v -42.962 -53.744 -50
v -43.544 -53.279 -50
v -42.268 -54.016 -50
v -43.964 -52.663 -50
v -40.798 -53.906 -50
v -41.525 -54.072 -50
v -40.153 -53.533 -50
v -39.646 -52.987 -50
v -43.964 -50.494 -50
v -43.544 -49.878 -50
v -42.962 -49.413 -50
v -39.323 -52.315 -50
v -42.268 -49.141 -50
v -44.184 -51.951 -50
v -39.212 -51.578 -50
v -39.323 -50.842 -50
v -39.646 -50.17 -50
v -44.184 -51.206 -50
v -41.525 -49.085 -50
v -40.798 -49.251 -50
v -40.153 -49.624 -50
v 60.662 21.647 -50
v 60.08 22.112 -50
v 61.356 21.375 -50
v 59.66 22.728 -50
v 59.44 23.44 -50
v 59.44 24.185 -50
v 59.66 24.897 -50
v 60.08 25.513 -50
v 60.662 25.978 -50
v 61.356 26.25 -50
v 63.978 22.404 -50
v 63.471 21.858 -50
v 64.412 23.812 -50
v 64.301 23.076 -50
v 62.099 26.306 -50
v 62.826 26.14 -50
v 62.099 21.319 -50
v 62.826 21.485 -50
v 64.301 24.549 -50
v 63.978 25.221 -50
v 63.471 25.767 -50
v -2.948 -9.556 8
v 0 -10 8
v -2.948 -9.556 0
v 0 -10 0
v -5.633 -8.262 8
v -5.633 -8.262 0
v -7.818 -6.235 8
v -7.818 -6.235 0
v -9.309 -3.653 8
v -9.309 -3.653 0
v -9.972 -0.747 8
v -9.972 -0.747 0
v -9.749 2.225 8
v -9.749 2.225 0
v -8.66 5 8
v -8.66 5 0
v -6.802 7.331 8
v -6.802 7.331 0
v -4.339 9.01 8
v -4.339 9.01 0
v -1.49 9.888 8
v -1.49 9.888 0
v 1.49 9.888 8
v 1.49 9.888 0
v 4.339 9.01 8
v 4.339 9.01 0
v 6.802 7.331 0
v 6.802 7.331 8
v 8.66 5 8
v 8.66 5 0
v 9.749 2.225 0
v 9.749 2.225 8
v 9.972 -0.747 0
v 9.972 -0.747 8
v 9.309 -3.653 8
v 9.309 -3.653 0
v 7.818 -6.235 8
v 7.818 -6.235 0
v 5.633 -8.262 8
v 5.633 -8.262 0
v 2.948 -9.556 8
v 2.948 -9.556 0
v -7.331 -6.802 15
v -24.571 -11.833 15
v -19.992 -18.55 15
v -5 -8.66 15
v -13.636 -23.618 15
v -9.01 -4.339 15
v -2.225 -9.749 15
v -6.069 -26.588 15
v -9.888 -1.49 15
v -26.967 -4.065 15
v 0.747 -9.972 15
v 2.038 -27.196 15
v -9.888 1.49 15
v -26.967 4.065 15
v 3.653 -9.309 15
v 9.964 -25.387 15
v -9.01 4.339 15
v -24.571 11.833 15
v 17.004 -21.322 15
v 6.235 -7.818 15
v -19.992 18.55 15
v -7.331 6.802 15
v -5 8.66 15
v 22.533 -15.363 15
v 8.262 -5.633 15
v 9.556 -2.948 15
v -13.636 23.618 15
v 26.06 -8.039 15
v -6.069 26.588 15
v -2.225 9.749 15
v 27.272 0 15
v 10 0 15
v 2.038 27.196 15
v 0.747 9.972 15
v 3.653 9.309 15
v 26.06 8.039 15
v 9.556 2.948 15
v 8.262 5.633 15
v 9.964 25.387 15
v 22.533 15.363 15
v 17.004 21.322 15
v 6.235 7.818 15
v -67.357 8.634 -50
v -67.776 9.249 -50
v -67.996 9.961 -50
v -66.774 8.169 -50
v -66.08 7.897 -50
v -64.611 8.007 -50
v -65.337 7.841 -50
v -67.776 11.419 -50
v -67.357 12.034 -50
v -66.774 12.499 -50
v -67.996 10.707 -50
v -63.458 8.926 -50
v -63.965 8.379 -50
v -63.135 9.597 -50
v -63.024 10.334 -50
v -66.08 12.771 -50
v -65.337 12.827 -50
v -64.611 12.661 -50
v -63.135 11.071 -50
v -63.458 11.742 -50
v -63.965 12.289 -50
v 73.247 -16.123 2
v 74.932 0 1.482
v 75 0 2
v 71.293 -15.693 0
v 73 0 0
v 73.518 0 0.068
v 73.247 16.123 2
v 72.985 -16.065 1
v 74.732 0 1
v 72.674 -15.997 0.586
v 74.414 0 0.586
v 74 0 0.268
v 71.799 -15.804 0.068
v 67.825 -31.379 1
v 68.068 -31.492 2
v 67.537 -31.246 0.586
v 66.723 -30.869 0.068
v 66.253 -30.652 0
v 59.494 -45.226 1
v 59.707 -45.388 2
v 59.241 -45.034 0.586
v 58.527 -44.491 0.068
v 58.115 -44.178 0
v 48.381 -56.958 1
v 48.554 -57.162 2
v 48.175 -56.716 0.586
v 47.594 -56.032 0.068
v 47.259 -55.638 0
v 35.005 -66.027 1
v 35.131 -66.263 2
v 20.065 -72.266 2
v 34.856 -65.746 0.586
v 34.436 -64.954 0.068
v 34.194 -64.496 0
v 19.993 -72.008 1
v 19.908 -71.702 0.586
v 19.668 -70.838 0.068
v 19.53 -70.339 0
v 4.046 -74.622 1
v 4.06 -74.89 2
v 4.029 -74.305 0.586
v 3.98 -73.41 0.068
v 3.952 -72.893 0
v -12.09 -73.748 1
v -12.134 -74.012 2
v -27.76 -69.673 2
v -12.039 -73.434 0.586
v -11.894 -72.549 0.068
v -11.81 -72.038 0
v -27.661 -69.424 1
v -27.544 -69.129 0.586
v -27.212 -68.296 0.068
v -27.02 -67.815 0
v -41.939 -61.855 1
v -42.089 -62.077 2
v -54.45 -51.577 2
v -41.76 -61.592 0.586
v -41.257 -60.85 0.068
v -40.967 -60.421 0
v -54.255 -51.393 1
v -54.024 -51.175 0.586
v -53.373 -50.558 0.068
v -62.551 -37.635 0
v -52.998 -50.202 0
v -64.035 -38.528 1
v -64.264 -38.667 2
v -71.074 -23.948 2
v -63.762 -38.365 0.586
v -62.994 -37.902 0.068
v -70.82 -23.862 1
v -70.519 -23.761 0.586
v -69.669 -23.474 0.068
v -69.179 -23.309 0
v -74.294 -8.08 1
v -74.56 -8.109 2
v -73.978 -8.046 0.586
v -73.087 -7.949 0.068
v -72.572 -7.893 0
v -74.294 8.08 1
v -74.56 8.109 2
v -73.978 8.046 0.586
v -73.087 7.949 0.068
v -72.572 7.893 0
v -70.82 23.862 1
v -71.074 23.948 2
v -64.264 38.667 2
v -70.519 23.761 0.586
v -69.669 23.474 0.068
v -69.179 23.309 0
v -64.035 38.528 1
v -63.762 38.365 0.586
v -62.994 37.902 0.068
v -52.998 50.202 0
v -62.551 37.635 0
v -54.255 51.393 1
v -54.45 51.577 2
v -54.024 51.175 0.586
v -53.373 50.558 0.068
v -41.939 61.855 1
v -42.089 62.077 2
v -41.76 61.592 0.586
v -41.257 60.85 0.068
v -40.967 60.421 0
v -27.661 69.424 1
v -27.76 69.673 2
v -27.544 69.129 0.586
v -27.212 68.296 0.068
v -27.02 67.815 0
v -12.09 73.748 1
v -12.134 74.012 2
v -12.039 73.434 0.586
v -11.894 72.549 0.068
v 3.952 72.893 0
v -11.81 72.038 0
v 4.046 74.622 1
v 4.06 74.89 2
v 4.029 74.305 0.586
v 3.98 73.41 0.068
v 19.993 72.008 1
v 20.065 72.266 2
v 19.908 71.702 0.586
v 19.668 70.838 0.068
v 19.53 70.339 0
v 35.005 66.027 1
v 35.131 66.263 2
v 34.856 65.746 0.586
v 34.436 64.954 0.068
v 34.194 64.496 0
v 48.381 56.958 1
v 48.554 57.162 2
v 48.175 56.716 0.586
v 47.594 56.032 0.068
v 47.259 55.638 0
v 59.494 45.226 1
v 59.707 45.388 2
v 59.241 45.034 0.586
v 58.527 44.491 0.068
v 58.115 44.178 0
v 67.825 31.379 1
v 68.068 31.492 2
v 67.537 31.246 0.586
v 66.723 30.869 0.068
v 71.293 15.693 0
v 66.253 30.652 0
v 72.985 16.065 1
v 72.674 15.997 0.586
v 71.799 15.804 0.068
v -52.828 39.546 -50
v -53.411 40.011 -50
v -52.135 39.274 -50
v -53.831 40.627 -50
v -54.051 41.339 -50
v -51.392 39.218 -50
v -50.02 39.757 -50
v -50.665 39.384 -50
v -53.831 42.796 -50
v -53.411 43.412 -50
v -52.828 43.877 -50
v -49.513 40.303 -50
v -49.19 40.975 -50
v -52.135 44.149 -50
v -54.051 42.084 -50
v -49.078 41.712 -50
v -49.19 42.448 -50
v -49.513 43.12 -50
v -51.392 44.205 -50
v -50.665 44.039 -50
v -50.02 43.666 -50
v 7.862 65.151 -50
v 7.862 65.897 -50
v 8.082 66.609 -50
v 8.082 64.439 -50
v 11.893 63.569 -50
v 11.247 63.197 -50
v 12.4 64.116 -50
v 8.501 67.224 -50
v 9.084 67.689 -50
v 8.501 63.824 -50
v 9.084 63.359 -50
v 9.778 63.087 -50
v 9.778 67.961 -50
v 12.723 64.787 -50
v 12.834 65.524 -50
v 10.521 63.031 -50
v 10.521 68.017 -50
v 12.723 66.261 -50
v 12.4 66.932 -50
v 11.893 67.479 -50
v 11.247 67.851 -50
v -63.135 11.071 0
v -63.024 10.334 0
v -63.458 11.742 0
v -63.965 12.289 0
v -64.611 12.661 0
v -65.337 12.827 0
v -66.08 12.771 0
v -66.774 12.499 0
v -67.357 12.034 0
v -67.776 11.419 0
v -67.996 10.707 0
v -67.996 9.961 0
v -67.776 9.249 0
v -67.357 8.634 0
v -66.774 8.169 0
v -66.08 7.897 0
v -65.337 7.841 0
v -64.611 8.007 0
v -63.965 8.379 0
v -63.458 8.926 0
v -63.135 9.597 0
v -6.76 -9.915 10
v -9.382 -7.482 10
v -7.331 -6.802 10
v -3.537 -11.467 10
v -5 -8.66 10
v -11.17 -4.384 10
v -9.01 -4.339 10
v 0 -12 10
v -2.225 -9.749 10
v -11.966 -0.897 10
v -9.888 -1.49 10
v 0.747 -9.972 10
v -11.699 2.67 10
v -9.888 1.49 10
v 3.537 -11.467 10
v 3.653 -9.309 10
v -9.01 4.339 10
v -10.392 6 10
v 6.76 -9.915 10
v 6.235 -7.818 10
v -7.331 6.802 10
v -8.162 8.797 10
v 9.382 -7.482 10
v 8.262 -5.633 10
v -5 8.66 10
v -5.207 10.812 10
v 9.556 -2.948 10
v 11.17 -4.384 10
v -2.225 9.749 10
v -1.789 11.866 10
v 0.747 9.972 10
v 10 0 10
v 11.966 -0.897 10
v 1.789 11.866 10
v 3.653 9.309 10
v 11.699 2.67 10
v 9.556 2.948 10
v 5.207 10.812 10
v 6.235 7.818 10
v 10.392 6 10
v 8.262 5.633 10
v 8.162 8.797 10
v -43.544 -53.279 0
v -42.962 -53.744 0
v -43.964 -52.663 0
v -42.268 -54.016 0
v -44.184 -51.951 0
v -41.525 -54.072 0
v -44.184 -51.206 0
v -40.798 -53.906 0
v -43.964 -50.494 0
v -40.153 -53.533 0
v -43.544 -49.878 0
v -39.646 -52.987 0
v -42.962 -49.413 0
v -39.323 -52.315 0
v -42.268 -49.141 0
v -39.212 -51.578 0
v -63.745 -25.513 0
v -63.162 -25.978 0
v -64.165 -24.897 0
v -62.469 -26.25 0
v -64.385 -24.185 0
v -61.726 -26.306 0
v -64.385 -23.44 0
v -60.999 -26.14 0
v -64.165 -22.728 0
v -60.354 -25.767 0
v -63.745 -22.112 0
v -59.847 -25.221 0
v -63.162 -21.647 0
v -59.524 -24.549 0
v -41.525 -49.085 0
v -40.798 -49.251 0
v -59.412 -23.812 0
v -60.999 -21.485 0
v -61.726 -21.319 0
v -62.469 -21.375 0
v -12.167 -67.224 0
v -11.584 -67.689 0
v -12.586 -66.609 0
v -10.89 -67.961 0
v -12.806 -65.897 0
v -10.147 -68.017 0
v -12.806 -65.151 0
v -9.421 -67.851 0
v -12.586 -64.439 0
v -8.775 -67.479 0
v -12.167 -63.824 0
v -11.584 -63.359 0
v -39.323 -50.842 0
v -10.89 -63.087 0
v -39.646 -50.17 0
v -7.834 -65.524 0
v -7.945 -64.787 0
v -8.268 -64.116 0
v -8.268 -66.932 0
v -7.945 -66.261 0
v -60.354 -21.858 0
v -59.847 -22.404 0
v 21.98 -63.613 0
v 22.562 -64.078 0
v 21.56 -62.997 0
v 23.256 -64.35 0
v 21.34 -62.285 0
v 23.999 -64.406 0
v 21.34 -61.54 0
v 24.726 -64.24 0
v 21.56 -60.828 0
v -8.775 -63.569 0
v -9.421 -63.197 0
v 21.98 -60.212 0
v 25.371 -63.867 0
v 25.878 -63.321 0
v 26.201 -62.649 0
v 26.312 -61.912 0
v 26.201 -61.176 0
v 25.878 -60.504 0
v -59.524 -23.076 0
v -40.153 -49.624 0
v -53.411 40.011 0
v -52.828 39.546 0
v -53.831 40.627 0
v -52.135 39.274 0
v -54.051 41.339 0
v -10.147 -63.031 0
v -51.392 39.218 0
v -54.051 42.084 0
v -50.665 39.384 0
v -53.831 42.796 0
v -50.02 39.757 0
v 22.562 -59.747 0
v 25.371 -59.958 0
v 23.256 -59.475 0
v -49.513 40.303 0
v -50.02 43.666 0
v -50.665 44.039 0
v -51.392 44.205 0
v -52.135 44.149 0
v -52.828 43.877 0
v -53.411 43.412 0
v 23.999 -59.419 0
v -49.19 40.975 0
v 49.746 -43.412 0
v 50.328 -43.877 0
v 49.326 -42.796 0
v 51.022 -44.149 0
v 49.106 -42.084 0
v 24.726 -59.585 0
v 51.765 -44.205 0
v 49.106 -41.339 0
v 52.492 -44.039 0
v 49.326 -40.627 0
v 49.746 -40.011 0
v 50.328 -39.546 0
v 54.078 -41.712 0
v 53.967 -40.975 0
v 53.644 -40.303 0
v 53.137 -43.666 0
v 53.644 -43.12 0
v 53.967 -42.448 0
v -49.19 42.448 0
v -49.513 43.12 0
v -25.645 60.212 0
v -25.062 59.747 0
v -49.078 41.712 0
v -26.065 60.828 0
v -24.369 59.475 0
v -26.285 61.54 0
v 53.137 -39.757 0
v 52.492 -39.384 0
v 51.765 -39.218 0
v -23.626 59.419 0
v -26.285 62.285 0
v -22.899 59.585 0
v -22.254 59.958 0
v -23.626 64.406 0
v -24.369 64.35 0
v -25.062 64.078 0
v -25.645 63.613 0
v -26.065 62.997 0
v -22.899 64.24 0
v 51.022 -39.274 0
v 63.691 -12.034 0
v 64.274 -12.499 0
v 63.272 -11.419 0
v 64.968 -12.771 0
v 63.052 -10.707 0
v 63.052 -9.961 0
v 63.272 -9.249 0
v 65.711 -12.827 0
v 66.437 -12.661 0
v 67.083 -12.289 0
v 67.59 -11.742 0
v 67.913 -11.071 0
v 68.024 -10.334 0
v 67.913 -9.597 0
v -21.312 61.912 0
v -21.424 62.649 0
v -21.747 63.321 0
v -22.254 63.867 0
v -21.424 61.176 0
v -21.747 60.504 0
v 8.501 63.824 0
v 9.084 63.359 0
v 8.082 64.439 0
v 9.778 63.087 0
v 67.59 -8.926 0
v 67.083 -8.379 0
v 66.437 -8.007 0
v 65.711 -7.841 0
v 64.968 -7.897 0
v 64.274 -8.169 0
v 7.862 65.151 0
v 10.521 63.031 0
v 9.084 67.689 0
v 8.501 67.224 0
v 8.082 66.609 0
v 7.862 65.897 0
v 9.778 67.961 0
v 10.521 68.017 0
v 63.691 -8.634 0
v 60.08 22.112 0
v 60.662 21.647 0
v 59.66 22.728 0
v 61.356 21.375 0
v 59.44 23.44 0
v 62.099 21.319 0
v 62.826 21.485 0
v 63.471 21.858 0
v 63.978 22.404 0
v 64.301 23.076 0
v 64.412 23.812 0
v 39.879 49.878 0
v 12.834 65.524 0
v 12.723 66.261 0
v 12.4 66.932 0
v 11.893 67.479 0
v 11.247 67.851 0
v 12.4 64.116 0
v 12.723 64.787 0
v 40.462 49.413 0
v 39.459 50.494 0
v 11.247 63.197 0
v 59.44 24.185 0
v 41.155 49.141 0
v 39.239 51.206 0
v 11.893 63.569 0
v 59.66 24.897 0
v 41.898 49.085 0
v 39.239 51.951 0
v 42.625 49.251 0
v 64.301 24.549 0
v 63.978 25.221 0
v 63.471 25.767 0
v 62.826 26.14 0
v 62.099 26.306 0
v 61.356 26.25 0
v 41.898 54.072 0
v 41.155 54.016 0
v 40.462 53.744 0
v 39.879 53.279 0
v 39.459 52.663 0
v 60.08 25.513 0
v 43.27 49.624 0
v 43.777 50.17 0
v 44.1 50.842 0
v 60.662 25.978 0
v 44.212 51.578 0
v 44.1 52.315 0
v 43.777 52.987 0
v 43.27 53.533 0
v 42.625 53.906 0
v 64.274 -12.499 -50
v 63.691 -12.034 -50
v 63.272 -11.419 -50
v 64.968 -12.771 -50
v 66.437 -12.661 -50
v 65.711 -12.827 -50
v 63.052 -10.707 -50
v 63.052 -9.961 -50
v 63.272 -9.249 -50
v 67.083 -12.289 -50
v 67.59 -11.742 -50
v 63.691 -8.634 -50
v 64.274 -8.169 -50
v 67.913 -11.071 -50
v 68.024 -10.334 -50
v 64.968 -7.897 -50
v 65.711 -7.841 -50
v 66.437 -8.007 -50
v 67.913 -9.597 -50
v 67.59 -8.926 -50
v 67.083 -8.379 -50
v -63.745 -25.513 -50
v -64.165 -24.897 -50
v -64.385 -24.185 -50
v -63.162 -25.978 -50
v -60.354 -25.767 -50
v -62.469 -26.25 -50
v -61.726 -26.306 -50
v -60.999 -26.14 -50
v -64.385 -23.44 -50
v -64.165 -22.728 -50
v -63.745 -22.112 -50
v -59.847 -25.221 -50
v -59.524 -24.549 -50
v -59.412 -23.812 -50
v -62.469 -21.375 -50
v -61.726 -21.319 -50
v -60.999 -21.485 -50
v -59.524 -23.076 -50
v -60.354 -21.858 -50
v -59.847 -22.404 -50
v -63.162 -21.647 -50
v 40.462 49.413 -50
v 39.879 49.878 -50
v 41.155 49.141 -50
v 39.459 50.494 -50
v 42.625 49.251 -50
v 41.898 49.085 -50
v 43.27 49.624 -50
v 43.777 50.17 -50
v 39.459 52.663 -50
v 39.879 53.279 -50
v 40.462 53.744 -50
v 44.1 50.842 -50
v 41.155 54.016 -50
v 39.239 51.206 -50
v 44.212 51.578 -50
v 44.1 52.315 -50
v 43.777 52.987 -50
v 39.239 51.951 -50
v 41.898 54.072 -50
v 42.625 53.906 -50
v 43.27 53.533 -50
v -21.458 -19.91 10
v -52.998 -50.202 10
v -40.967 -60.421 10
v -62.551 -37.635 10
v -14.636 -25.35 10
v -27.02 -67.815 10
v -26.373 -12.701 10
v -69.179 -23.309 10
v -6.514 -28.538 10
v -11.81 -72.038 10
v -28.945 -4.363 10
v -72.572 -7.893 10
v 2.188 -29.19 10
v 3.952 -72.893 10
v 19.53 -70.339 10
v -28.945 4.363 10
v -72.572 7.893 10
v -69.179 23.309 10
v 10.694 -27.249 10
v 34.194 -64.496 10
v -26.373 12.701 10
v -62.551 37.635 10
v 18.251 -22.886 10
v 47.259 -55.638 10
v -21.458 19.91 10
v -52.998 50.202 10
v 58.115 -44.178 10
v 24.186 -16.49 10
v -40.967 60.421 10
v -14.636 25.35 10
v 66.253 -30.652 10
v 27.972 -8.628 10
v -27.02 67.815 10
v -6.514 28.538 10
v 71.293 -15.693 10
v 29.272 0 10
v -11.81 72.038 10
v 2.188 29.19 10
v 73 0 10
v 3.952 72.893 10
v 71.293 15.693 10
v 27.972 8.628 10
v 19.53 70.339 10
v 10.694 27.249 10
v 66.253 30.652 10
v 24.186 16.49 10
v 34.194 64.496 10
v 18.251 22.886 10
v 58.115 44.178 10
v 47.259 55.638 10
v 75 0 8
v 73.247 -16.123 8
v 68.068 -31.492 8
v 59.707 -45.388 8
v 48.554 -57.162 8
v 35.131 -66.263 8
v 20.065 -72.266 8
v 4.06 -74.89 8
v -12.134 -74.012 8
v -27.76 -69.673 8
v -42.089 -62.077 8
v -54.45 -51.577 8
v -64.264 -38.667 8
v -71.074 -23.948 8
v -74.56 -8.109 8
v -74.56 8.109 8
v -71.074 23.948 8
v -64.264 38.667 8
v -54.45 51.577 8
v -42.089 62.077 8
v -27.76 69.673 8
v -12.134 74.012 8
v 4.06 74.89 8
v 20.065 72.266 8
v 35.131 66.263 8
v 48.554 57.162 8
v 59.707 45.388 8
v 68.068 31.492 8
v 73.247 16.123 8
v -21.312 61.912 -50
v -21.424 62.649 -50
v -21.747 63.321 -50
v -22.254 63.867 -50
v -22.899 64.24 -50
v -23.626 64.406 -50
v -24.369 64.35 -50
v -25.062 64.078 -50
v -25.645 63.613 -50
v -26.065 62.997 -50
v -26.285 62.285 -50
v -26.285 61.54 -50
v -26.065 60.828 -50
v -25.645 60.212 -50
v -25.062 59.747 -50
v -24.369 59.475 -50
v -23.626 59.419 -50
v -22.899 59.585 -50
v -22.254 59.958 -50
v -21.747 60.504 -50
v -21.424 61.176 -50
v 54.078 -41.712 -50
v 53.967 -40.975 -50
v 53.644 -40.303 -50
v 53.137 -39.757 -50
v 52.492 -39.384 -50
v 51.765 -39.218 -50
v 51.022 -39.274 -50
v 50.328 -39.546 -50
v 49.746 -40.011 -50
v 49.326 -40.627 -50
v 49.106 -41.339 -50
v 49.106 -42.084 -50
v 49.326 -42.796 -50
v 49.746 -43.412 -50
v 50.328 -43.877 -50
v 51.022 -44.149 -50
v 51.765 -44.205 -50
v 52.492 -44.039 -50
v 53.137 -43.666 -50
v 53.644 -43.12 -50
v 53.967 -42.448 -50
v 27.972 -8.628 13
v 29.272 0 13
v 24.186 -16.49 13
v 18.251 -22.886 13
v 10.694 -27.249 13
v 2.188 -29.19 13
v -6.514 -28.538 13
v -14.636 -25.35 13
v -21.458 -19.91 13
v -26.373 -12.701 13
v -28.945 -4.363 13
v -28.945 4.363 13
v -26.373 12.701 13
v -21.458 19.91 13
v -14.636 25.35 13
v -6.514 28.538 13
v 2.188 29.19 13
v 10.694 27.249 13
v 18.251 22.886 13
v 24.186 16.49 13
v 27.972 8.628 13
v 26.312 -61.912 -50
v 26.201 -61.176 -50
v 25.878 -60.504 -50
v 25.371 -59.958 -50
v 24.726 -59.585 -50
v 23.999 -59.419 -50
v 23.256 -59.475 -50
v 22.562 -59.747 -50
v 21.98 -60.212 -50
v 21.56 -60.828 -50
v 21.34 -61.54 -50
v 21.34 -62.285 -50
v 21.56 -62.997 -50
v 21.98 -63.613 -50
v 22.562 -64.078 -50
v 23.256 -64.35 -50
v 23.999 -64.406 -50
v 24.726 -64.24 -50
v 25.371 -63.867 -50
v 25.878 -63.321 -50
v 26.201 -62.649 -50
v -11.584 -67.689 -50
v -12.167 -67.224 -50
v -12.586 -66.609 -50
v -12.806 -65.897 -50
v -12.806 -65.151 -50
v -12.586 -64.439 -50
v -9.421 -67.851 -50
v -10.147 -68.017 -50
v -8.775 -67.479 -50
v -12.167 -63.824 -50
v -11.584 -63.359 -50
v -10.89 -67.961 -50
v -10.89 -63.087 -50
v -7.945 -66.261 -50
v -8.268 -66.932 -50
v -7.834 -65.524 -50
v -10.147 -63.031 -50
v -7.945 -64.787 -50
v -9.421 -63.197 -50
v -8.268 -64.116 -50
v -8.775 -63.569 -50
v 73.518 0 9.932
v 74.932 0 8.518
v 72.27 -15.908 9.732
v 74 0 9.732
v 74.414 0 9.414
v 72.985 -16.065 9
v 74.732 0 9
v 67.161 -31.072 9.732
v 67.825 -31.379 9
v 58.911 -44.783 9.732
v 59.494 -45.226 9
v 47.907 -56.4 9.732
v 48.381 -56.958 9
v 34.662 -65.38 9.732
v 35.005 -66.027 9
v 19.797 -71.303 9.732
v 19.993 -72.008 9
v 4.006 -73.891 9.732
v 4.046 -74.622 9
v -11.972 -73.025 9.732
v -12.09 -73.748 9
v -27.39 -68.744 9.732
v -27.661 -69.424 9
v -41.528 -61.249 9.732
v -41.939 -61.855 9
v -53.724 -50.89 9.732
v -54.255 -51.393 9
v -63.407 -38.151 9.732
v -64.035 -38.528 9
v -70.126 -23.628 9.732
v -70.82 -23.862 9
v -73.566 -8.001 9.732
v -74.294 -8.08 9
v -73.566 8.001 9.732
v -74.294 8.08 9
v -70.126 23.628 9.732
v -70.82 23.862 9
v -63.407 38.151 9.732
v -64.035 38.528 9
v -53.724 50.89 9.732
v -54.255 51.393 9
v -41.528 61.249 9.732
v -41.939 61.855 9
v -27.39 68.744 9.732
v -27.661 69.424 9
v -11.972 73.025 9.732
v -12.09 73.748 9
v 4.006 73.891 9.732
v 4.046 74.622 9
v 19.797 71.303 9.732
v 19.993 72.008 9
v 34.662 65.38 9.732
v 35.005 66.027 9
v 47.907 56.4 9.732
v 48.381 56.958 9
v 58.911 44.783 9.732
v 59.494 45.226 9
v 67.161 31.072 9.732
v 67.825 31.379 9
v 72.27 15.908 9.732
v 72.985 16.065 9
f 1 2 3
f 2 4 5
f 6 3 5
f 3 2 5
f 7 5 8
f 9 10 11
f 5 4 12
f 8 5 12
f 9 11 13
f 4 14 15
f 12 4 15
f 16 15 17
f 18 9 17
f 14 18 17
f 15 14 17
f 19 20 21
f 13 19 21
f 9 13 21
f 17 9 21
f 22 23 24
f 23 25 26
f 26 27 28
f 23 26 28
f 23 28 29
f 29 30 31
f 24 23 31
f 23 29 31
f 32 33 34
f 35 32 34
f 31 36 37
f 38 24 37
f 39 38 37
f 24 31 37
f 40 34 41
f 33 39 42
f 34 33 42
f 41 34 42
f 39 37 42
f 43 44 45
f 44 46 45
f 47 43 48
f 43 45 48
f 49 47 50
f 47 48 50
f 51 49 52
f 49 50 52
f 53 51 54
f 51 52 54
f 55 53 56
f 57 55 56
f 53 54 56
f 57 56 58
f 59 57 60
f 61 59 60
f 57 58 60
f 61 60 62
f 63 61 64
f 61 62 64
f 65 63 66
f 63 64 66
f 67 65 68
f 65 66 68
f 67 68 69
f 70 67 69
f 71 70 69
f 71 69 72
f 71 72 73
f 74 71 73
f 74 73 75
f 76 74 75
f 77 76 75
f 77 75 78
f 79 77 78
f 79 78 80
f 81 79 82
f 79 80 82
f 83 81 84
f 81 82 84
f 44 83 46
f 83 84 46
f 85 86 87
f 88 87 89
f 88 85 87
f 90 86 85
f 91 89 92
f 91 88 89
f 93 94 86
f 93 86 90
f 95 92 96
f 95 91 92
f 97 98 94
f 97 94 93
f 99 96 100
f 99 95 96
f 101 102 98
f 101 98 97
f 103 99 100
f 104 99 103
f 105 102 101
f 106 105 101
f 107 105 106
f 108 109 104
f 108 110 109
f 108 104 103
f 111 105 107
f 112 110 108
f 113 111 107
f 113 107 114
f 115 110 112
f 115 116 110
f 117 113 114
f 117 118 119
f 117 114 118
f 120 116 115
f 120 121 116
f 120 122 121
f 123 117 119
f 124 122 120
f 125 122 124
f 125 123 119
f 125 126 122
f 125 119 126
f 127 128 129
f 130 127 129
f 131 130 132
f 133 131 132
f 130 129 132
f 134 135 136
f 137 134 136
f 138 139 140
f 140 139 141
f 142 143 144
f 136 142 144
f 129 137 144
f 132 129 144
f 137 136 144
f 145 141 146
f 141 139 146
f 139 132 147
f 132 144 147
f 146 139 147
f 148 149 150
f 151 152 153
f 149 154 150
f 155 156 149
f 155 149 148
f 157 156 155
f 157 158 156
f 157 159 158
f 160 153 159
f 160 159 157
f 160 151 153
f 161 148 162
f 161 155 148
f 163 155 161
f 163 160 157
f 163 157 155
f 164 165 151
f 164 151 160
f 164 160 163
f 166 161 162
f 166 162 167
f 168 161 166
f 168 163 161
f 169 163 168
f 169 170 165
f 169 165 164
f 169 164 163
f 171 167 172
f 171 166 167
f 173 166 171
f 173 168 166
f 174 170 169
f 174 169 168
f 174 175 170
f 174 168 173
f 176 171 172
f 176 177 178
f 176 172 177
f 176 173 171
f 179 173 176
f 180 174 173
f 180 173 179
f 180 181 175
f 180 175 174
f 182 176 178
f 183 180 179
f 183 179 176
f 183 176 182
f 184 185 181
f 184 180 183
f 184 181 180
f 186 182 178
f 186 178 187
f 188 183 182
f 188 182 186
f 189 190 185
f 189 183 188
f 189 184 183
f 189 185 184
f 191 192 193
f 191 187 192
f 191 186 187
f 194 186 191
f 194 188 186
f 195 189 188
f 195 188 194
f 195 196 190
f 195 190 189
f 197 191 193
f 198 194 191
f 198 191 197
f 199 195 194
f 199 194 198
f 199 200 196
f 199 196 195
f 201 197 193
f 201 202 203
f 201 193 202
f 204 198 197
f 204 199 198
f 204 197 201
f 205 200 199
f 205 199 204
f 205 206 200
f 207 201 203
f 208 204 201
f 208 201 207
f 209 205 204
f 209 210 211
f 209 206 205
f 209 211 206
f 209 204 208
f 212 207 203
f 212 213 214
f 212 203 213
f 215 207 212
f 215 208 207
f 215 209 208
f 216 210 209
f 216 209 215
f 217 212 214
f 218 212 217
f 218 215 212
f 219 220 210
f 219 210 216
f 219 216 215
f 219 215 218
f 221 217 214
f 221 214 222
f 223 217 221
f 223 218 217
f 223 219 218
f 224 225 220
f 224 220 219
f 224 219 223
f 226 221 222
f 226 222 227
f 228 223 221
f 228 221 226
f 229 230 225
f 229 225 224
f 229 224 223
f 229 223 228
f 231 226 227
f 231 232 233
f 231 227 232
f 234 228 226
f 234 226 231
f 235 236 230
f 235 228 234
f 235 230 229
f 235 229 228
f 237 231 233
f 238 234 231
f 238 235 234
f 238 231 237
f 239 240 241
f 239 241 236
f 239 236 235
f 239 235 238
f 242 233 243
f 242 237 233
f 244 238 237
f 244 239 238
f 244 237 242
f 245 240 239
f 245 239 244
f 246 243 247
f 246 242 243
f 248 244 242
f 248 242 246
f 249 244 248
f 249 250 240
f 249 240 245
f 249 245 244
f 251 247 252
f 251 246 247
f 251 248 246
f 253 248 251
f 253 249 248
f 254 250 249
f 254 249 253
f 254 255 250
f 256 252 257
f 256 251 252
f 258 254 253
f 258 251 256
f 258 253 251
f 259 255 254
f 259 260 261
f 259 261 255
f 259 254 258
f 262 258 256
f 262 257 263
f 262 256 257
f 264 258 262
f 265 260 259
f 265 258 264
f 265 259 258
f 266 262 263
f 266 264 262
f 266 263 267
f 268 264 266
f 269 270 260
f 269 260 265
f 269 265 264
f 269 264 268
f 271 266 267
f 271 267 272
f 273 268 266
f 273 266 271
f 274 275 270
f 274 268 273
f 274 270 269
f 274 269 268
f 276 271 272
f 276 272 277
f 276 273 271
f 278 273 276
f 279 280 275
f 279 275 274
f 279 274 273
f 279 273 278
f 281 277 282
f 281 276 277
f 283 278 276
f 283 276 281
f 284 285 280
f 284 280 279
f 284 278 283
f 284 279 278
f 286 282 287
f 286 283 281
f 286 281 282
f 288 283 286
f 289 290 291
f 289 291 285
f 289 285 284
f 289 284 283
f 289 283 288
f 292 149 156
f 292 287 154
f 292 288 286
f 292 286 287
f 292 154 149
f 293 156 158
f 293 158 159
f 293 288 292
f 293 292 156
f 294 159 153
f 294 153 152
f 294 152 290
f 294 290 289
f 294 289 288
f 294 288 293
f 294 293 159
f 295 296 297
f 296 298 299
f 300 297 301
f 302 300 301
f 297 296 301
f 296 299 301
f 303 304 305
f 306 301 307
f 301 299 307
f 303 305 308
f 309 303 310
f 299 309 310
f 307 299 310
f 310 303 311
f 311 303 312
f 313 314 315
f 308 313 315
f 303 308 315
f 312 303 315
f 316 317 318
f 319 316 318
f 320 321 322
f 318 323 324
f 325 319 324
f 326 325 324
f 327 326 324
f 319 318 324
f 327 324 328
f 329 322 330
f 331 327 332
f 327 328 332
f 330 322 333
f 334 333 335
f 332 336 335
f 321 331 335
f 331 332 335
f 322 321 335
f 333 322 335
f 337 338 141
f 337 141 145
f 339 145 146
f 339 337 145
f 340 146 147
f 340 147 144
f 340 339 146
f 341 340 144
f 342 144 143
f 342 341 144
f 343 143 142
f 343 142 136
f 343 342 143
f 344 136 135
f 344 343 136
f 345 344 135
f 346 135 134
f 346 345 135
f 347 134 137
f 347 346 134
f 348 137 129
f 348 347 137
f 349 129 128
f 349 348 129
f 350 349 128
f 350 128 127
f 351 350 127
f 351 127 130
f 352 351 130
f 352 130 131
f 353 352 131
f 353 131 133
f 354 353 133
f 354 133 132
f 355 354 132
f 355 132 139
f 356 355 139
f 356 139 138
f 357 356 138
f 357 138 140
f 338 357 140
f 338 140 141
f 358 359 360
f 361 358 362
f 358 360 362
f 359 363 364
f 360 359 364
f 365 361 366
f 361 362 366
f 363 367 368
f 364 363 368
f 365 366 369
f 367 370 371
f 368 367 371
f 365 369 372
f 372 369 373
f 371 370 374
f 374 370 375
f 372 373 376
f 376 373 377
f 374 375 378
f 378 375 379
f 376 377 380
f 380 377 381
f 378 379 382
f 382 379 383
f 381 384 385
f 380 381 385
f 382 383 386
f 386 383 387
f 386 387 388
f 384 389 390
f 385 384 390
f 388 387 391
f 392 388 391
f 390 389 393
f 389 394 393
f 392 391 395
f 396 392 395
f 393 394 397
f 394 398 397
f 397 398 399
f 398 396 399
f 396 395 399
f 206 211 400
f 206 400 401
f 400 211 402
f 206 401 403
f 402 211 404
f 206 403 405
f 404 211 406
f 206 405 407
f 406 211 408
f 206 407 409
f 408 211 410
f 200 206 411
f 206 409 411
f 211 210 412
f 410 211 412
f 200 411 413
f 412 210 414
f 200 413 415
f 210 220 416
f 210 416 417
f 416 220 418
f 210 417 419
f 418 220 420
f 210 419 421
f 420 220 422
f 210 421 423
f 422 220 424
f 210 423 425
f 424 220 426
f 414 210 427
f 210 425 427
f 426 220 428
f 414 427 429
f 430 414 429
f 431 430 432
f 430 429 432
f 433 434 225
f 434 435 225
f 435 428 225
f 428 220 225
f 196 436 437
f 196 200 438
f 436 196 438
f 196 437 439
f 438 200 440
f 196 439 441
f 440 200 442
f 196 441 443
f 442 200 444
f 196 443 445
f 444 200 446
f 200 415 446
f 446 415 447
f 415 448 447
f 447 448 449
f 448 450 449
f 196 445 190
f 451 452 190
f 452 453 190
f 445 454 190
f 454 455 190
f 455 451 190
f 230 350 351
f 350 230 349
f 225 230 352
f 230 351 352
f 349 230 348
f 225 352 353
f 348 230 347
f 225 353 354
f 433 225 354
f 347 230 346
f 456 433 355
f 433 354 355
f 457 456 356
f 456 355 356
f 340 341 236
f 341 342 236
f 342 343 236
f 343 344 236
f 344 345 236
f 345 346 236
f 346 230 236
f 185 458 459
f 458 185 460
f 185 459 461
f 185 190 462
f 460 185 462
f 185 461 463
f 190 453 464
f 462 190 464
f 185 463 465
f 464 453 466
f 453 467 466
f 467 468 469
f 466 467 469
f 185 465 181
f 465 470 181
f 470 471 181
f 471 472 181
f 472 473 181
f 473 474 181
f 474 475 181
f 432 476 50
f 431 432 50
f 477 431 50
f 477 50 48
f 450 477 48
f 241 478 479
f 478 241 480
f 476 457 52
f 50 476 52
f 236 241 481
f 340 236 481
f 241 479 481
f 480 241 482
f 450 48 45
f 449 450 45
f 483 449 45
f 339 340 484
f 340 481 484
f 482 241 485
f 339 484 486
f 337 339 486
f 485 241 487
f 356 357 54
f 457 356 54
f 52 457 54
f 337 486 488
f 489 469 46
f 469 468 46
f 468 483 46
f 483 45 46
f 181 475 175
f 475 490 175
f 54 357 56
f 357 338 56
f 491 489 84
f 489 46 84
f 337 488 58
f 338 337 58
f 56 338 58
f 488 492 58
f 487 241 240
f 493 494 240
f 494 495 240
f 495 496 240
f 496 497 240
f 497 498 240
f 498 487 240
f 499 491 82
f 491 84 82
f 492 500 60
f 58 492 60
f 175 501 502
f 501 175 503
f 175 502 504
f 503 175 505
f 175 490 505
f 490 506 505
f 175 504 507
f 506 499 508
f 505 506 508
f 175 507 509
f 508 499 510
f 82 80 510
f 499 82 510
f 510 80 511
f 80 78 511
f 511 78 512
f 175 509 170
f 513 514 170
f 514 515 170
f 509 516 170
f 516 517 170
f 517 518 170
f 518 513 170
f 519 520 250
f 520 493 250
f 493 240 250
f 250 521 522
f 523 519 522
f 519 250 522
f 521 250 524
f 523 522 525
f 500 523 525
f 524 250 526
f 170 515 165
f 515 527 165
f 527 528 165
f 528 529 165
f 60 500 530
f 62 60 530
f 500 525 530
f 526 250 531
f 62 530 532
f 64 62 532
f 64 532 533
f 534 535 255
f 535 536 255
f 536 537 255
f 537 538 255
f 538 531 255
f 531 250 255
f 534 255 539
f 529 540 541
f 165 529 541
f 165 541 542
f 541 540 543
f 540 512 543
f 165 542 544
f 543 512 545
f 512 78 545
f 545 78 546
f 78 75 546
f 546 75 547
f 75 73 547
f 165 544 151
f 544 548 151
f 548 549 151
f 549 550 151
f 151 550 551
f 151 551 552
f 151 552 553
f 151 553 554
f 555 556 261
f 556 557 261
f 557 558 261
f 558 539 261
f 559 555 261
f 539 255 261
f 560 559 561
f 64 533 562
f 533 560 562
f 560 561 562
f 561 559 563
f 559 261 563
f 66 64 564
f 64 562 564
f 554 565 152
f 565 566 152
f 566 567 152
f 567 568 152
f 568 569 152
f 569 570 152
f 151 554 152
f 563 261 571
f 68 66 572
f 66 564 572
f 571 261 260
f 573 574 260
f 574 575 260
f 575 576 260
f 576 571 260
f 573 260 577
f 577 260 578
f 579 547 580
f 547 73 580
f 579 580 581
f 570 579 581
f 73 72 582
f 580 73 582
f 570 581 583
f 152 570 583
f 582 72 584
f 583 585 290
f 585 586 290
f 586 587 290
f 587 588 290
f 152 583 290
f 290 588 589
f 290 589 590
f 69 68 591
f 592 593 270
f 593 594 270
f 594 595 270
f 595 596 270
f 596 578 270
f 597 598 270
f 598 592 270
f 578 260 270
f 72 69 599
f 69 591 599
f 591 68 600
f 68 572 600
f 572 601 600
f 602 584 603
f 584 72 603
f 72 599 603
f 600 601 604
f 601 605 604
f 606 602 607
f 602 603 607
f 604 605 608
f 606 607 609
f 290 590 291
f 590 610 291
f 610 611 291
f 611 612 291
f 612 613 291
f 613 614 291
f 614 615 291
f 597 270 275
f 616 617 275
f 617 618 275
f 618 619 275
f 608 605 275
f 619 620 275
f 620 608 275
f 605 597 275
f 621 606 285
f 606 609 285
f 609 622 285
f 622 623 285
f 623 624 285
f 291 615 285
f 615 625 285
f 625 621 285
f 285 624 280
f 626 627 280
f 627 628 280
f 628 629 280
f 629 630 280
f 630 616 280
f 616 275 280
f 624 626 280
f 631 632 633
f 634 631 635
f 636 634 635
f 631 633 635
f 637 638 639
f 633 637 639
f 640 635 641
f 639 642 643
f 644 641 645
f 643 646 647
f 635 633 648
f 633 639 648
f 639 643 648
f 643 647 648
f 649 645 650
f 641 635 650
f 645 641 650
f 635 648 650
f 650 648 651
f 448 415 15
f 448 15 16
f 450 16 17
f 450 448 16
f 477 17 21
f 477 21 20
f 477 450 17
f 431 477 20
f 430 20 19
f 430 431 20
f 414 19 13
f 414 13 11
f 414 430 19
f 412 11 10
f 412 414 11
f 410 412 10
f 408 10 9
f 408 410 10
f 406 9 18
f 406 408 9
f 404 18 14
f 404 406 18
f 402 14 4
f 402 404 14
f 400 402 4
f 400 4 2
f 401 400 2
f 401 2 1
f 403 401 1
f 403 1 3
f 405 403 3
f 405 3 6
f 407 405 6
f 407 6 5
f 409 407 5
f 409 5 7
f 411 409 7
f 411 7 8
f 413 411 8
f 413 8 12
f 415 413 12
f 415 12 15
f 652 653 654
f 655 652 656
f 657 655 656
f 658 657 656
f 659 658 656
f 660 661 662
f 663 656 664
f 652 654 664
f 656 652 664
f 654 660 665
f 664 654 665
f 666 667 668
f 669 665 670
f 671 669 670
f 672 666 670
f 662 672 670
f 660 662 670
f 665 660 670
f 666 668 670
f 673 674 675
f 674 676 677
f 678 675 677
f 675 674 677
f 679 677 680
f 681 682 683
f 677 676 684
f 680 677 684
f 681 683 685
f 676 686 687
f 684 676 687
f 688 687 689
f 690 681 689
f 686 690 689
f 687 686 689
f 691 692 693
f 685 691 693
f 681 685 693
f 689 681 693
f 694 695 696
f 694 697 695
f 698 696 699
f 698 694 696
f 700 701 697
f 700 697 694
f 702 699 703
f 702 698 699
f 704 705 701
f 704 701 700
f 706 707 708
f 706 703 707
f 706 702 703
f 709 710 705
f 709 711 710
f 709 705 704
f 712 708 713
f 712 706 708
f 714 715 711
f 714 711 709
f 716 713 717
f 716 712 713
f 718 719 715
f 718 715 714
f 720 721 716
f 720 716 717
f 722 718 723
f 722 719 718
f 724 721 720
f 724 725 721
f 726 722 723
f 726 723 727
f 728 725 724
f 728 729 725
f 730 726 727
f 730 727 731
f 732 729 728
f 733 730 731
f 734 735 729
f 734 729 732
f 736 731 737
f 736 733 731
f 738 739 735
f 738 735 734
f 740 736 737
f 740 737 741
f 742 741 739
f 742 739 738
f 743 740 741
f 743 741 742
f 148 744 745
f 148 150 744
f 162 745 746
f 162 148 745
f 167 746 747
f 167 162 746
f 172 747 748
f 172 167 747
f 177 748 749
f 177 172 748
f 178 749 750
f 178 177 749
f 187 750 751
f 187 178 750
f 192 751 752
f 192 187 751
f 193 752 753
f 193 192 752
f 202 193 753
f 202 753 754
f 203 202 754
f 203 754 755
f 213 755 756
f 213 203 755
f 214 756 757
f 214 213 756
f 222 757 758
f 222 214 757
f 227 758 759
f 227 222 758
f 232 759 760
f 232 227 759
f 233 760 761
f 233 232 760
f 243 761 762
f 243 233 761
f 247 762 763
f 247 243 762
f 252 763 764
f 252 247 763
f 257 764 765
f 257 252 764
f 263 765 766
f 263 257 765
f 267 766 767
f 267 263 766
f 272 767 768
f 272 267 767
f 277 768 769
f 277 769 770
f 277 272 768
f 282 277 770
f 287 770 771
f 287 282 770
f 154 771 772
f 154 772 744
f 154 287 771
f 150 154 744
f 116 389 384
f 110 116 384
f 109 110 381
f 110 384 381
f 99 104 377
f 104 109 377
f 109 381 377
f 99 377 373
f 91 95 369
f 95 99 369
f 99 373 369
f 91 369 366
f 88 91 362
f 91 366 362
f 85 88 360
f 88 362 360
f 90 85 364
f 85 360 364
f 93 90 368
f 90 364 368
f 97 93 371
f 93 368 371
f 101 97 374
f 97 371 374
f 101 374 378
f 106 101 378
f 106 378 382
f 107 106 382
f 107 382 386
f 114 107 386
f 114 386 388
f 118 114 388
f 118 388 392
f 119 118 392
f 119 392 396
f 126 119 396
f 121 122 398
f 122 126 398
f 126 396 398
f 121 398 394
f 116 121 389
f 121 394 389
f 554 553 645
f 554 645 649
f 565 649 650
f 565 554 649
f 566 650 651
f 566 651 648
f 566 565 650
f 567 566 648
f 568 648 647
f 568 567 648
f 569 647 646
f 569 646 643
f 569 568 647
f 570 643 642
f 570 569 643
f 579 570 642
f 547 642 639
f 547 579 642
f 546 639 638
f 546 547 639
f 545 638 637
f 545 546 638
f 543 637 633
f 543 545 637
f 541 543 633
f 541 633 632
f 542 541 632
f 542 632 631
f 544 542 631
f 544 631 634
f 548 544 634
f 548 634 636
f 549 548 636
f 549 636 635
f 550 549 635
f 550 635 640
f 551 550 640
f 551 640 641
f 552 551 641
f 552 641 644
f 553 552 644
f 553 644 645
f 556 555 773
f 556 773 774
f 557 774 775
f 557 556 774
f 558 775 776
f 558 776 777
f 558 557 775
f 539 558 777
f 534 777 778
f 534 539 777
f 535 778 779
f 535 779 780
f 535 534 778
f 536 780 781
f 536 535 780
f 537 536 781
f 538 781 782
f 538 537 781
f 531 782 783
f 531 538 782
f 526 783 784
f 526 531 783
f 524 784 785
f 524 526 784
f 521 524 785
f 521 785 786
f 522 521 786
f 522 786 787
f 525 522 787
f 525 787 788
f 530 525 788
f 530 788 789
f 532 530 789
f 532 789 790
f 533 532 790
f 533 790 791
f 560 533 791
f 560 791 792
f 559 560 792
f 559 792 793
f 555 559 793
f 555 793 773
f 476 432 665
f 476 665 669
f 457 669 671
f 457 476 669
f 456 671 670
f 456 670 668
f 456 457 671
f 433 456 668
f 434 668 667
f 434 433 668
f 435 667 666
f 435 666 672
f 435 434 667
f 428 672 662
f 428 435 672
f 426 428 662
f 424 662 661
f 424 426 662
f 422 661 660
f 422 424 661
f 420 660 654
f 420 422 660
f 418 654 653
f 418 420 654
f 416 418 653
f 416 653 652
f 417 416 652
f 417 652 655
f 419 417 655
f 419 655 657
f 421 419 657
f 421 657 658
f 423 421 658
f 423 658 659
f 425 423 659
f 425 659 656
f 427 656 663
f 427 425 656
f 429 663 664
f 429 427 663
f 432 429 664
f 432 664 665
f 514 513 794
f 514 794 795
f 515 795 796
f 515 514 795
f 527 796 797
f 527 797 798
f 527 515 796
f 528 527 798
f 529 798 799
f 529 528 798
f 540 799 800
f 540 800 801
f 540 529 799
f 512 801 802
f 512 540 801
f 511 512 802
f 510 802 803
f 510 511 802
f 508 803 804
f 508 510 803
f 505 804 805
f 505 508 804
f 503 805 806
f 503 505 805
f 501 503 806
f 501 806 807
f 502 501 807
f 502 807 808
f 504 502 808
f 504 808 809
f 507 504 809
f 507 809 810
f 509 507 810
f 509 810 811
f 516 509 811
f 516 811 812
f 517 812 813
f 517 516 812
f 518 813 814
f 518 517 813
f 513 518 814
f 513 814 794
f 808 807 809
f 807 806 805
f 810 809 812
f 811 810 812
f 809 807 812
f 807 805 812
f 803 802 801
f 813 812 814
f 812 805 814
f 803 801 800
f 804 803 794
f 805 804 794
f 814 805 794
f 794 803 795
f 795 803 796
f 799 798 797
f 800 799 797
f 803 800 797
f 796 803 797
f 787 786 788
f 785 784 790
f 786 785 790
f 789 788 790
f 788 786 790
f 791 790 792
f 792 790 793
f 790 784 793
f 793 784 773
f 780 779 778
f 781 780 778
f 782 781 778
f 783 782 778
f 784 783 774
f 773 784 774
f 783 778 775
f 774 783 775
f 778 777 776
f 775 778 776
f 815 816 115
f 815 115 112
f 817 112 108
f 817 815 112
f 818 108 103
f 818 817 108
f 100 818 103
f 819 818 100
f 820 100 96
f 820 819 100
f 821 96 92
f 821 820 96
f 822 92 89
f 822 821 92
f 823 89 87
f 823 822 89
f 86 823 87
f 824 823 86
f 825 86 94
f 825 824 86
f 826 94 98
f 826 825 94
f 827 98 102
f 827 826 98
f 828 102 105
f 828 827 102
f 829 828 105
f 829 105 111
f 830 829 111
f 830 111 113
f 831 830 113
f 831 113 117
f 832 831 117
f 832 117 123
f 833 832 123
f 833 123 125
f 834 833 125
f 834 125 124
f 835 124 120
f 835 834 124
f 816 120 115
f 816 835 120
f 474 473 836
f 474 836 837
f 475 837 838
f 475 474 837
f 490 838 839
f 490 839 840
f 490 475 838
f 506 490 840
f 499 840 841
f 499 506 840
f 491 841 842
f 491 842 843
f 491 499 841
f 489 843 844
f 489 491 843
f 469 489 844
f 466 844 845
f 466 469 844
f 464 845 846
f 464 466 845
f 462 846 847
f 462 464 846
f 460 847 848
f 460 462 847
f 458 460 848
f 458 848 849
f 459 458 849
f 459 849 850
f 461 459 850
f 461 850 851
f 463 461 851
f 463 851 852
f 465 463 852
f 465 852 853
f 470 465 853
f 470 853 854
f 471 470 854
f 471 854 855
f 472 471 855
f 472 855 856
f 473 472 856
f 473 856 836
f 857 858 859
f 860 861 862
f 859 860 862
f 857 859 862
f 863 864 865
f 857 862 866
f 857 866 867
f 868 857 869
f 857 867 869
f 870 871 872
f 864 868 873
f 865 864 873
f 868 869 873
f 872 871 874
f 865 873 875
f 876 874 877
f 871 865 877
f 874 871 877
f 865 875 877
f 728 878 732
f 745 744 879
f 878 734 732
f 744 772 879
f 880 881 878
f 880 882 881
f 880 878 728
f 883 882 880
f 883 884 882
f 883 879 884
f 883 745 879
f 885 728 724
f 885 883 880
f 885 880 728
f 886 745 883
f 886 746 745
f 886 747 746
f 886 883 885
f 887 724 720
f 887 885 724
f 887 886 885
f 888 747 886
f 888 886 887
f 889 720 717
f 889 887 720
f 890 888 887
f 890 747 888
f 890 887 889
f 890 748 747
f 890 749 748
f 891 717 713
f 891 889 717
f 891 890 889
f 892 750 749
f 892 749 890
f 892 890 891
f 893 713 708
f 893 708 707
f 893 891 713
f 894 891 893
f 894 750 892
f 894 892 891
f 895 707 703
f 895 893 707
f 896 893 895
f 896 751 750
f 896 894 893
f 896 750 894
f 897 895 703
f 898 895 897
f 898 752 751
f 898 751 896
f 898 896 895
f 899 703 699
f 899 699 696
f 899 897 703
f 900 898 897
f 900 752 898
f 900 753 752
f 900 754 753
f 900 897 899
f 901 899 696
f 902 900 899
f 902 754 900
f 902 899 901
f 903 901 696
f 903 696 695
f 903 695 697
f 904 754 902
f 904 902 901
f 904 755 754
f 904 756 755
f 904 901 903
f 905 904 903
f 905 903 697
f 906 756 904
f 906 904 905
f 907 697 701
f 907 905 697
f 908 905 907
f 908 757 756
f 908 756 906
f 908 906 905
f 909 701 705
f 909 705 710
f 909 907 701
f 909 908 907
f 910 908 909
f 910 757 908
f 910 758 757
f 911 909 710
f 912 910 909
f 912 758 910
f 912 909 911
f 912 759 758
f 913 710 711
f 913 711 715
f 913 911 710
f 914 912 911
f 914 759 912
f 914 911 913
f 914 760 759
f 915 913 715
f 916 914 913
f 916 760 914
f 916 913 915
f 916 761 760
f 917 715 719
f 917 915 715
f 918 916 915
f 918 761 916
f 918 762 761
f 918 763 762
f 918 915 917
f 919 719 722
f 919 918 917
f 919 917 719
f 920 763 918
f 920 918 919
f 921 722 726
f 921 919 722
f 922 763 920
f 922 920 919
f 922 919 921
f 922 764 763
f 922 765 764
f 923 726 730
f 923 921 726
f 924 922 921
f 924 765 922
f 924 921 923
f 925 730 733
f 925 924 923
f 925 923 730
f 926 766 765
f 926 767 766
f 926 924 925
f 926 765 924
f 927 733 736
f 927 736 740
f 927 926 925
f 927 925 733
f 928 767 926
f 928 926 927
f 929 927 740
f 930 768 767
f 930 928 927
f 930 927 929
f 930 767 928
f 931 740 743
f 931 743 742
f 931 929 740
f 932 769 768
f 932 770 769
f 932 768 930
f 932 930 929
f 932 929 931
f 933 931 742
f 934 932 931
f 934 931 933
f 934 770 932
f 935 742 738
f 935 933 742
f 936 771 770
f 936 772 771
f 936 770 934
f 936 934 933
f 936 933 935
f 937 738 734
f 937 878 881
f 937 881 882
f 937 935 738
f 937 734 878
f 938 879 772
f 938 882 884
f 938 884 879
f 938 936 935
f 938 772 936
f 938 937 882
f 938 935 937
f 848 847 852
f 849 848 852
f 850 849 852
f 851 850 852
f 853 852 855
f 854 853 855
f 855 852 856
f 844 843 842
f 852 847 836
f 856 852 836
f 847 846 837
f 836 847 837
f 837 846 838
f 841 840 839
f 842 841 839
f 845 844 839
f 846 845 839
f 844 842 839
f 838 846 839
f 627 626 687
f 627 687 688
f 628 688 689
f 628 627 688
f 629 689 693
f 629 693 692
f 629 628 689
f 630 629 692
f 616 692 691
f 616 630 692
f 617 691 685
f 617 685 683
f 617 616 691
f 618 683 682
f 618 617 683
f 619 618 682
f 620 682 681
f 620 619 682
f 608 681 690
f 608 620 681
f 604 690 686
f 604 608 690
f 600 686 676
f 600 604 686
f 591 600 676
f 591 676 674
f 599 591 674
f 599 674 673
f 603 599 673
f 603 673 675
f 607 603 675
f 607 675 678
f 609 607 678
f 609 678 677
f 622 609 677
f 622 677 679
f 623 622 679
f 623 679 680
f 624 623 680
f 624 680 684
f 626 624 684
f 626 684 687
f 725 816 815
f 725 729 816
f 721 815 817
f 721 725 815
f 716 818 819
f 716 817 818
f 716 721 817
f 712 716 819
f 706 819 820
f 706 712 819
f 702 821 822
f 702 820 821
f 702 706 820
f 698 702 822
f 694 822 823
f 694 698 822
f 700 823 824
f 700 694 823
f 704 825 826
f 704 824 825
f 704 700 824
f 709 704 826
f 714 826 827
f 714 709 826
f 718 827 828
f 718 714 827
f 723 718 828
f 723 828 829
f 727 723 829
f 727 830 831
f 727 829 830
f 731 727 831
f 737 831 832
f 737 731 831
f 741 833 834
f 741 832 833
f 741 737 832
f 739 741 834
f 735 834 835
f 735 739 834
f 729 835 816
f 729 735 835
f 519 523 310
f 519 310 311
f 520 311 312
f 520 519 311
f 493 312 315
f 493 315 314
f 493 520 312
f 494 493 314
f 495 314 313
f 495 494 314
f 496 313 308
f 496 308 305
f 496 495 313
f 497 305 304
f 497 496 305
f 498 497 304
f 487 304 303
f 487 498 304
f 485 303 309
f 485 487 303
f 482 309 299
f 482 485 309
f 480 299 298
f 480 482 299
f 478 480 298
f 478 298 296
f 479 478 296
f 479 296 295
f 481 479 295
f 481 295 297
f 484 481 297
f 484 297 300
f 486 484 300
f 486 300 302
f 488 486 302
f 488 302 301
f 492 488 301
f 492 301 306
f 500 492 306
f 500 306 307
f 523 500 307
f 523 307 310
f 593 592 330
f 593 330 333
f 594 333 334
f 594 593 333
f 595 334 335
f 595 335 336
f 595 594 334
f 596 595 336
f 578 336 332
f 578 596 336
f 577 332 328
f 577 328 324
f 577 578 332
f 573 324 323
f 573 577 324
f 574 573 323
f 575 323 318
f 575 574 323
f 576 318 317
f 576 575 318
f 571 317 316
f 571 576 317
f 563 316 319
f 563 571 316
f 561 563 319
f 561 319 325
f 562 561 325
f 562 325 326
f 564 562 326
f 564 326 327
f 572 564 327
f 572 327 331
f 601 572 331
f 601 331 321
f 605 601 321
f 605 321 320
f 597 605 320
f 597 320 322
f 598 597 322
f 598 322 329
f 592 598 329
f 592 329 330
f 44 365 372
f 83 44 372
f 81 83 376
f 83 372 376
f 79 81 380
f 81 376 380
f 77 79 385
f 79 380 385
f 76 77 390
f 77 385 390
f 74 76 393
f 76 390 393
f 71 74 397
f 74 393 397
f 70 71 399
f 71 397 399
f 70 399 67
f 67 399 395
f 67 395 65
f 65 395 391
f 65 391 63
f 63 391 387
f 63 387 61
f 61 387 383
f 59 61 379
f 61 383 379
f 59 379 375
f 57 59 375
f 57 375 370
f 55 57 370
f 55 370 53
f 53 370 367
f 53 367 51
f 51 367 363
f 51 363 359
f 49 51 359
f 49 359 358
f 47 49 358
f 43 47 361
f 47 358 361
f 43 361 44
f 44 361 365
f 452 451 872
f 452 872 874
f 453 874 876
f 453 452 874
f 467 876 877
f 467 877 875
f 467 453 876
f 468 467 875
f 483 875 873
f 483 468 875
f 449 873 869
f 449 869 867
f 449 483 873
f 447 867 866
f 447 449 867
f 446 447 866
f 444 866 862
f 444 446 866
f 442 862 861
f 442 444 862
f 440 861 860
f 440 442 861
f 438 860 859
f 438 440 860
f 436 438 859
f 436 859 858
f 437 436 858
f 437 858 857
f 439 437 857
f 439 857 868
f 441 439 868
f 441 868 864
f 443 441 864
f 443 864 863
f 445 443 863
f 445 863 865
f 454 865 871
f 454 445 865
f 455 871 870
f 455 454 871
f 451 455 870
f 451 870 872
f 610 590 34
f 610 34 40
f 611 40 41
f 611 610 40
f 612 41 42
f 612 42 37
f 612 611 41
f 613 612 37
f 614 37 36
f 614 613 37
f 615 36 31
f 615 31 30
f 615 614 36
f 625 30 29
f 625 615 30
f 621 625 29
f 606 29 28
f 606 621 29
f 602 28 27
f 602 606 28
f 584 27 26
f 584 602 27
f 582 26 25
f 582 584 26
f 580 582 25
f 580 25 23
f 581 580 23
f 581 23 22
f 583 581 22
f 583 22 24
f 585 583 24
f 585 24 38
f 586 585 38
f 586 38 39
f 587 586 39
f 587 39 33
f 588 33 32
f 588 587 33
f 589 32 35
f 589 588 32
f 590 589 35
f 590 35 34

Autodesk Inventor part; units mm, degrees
ref_plane "YZ Plane" through (0, 0, 0) normal (1, 0, 0) x (0, 1, 0)
ref_plane "XZ Plane" through (0, 0, 0) normal (0, 1, 0) x (-1, 0, 0)
ref_plane "XY Plane" through (0, 0, 0) normal (0, 0, 1) x (1, 0, 0)
sketch "Sketch1" plane through (0, 0, 0) normal (0, 0, 1) x (1, 0, 0)
  point P0 (0, 0)
sketch "Sketch2" plane through (0, 0, 0) normal (0, 0, 1) x (1, 0, 0)
  circle A0 centre (0, 0) radius 75
  line L0 (-65.0875, -9.525) -> (-104.775, -39.6875) construction
  line L1 (-104.775, -39.6875) -> (-119.0625, -20.6375) construction
  line L2 (-119.0625, -20.6375) -> (-158.75, -15.875) construction
  line L3 (-158.75, -15.875) -> (-179.3875, -52.3875) construction
  spline S0 degree 4 poles (-65.0875, -9.525) (-104.775, -39.6875) (-119.0625, -20.6375) (-158.75, -15.875) (-179.3875, -52.3875) knots 1 1 1 1 1 2 2 2 2 2
  circle A1 centre (-65.0875, -9.525) radius 2.5
  dimension "d0" = 150
  dimension "d87" = 5
extrude "Extrusion1" add sketch "Sketch2" along normal blind 10 contours A0 | A1
hole "Hole1" at (0, 0, 0) direction (0, 0, 1) diameter 5 end through all
sketch "Sketch3" plane through (0, 0, 10) normal (0, 0, 1) x (1, 0, 0)
  point P0 (0, 0)
sketch "Sketch4" plane through (0, 0, 10) normal (0, 0, 1) x (1, 0, 0)
  point P0 (0, 0)
hole "Hole2" at (0, 0, 10) direction (0, 0, -1) diameter 20 end through all
chamfer "Chamfer1" distance 2 angle 45 1 edges at (0, 10, 10)
fillet "Fillet1" radius 2 1 edges at (-75, 0, 10)
fillet "Fillet2" radius 2 1 edges at (-75, 0, 0)
sketch "Sketch8" plane through (0, 0, 10) normal (0, 0, 1) x (1, 0, 0)
  circle A0 centre (0, 0) radius 10 projected
  circle A1 centre (0, 0) radius 29.2721
extrude "Extrusion4" add sketch "Sketch8" along normal blind 5
chamfer "Chamfer2" distance 2 angle 45 1 edges at (-29.2721, 0, 15)
sketch "Sketch24" plane through (0, 0, 0) normal (1, 0, 0) x (0, 1, 0)
  line L0 (10, 0) -> (-10, 0) projected
  point P0 (0, 0)
sketch "Sketch25" plane through (0, 0, 0) normal (0, 0, 1) x (1, 0, 0)
  circle A0 centre (0, 0) radius 10 projected
  circle A1 centre (0, 0) radius 73 projected
  circle A2 centre (23.8125, -61.9125) radius 2.5
  circle A3 centre (51.5785, -41.7115) radius 2.5
  circle A4 centre (65.524, -10.334) radius 2.5
  circle A5 centre (61.9125, 23.8125) radius 2.5
  circle A6 centre (41.7115, 51.5785) radius 2.5
  circle A7 centre (10.334, 65.524) radius 2.5
  circle A8 centre (-23.8125, 61.9125) radius 2.5
  circle A9 centre (-51.5785, 41.7115) radius 2.5
  circle A10 centre (-65.524, 10.334) radius 2.5
  circle A11 centre (-61.9125, -23.8125) radius 2.5
  circle A12 centre (-41.7115, -51.5785) radius 2.5
  circle A13 centre (-10.334, -65.524) radius 2.5
  circle A14 centre (0, 0) radius 10 projected
  circle A15 centre (0, 0) radius 10 projected
  dimension "d104" = 5
  dimension "d107" = 360
sketch "Sketch26" plane through (0, 0, 0) normal (0, 0, -1) x (-1, 0, 0)
  point P0 (0, 0)
extrude "Extrusion6" add sketch "Sketch25" against normal blind 50 contours A3 | A4 | A5 | A6 | A7 | A8 | A9 | A10 | A11 | A12 | A13
sketch "Sketch28" plane through (0, 0, 0) normal (0, 0, -1) x (-1, 0, 0)
  circle A0 centre (-51.5785, -41.7115) radius 2.5 projected
  circle A1 centre (65.524, 10.334) radius 2.5 projected
  circle A2 centre (-51.5785, -41.7115) radius 2.5 projected
  circle A3 centre (-10.334, 65.524) radius 2.5 projected
  circle A4 centre (-65.524, -10.334) radius 2.5 projected
  circle A5 centre (61.9125, -23.8125) radius 2.5 projected
  circle A6 centre (51.5785, 41.7115) radius 2.5 projected
  circle A7 centre (10.334, -65.524) radius 2.5 projected
  circle A8 centre (-41.7115, 51.5785) radius 2.5 projected
  circle A9 centre (-61.9125, 23.8125) radius 2.5 projected
  circle A10 centre (41.7115, -51.5785) radius 2.5 projected
  circle A11 centre (23.8125, 61.9125) radius 2.5 projected
  circle A12 centre (0, 0) radius 10 projected
  circle A13 centre (0, 0) radius 73 projected
  circle A14 centre (65.524, 10.334) radius 2.5 projected
  circle A15 centre (-51.5785, -41.7115) radius 2.5 projected
  circle A16 centre (-10.334, 65.524) radius 2.5 projected
  circle A17 centre (-65.524, -10.334) radius 2.5 projected
  circle A18 centre (61.9125, -23.8125) radius 2.5 projected
  circle A19 centre (51.5785, 41.7115) radius 2.5 projected
  circle A20 centre (10.334, -65.524) radius 2.5 projected
  circle A21 centre (-41.7115, 51.5785) radius 2.5 projected
  circle A22 centre (-61.9125, 23.8125) radius 2.5 projected
  circle A23 centre (41.7115, -51.5785) radius 2.5 projected
  circle A24 centre (23.8125, 61.9125) radius 2.5 projected
  circle A25 centre (0, 0) radius 10 projected
  circle A26 centre (0, 0) radius 73 projected
  circle A27 centre (65.524, 10.334) radius 2.5 projected
  circle A28 centre (-51.5785, -41.7115) radius 2.5 projected
  circle A29 centre (-10.334, 65.524) radius 2.5 projected
  circle A30 centre (-65.524, -10.334) radius 2.5 projected
  circle A31 centre (61.9125, -23.8125) radius 2.5 projected
  circle A32 centre (51.5785, 41.7115) radius 2.5 projected
  circle A33 centre (10.334, -65.524) radius 2.5 projected
  circle A34 centre (-41.7115, 51.5785) radius 2.5 projected
  circle A35 centre (-61.9125, 23.8125) radius 2.5 projected
  circle A36 centre (41.7115, -51.5785) radius 2.5 projected
  circle A37 centre (23.8125, 61.9125) radius 2.5 projected
  circle A38 centre (0, 0) radius 10 projected
  circle A39 centre (0, 0) radius 73 projected
sketch "Sketch29" plane through (0, 0, 0) normal (0, 0, 1) x (1, 0, 0)
  circle A0 centre (23.8125, -61.9125) radius 2.5
  point P0 (0, 0)
  dimension "d111" = 5
extrude "Extrusion7" add sketch "Sketch29" against normal blind 50
properties part number "base"
